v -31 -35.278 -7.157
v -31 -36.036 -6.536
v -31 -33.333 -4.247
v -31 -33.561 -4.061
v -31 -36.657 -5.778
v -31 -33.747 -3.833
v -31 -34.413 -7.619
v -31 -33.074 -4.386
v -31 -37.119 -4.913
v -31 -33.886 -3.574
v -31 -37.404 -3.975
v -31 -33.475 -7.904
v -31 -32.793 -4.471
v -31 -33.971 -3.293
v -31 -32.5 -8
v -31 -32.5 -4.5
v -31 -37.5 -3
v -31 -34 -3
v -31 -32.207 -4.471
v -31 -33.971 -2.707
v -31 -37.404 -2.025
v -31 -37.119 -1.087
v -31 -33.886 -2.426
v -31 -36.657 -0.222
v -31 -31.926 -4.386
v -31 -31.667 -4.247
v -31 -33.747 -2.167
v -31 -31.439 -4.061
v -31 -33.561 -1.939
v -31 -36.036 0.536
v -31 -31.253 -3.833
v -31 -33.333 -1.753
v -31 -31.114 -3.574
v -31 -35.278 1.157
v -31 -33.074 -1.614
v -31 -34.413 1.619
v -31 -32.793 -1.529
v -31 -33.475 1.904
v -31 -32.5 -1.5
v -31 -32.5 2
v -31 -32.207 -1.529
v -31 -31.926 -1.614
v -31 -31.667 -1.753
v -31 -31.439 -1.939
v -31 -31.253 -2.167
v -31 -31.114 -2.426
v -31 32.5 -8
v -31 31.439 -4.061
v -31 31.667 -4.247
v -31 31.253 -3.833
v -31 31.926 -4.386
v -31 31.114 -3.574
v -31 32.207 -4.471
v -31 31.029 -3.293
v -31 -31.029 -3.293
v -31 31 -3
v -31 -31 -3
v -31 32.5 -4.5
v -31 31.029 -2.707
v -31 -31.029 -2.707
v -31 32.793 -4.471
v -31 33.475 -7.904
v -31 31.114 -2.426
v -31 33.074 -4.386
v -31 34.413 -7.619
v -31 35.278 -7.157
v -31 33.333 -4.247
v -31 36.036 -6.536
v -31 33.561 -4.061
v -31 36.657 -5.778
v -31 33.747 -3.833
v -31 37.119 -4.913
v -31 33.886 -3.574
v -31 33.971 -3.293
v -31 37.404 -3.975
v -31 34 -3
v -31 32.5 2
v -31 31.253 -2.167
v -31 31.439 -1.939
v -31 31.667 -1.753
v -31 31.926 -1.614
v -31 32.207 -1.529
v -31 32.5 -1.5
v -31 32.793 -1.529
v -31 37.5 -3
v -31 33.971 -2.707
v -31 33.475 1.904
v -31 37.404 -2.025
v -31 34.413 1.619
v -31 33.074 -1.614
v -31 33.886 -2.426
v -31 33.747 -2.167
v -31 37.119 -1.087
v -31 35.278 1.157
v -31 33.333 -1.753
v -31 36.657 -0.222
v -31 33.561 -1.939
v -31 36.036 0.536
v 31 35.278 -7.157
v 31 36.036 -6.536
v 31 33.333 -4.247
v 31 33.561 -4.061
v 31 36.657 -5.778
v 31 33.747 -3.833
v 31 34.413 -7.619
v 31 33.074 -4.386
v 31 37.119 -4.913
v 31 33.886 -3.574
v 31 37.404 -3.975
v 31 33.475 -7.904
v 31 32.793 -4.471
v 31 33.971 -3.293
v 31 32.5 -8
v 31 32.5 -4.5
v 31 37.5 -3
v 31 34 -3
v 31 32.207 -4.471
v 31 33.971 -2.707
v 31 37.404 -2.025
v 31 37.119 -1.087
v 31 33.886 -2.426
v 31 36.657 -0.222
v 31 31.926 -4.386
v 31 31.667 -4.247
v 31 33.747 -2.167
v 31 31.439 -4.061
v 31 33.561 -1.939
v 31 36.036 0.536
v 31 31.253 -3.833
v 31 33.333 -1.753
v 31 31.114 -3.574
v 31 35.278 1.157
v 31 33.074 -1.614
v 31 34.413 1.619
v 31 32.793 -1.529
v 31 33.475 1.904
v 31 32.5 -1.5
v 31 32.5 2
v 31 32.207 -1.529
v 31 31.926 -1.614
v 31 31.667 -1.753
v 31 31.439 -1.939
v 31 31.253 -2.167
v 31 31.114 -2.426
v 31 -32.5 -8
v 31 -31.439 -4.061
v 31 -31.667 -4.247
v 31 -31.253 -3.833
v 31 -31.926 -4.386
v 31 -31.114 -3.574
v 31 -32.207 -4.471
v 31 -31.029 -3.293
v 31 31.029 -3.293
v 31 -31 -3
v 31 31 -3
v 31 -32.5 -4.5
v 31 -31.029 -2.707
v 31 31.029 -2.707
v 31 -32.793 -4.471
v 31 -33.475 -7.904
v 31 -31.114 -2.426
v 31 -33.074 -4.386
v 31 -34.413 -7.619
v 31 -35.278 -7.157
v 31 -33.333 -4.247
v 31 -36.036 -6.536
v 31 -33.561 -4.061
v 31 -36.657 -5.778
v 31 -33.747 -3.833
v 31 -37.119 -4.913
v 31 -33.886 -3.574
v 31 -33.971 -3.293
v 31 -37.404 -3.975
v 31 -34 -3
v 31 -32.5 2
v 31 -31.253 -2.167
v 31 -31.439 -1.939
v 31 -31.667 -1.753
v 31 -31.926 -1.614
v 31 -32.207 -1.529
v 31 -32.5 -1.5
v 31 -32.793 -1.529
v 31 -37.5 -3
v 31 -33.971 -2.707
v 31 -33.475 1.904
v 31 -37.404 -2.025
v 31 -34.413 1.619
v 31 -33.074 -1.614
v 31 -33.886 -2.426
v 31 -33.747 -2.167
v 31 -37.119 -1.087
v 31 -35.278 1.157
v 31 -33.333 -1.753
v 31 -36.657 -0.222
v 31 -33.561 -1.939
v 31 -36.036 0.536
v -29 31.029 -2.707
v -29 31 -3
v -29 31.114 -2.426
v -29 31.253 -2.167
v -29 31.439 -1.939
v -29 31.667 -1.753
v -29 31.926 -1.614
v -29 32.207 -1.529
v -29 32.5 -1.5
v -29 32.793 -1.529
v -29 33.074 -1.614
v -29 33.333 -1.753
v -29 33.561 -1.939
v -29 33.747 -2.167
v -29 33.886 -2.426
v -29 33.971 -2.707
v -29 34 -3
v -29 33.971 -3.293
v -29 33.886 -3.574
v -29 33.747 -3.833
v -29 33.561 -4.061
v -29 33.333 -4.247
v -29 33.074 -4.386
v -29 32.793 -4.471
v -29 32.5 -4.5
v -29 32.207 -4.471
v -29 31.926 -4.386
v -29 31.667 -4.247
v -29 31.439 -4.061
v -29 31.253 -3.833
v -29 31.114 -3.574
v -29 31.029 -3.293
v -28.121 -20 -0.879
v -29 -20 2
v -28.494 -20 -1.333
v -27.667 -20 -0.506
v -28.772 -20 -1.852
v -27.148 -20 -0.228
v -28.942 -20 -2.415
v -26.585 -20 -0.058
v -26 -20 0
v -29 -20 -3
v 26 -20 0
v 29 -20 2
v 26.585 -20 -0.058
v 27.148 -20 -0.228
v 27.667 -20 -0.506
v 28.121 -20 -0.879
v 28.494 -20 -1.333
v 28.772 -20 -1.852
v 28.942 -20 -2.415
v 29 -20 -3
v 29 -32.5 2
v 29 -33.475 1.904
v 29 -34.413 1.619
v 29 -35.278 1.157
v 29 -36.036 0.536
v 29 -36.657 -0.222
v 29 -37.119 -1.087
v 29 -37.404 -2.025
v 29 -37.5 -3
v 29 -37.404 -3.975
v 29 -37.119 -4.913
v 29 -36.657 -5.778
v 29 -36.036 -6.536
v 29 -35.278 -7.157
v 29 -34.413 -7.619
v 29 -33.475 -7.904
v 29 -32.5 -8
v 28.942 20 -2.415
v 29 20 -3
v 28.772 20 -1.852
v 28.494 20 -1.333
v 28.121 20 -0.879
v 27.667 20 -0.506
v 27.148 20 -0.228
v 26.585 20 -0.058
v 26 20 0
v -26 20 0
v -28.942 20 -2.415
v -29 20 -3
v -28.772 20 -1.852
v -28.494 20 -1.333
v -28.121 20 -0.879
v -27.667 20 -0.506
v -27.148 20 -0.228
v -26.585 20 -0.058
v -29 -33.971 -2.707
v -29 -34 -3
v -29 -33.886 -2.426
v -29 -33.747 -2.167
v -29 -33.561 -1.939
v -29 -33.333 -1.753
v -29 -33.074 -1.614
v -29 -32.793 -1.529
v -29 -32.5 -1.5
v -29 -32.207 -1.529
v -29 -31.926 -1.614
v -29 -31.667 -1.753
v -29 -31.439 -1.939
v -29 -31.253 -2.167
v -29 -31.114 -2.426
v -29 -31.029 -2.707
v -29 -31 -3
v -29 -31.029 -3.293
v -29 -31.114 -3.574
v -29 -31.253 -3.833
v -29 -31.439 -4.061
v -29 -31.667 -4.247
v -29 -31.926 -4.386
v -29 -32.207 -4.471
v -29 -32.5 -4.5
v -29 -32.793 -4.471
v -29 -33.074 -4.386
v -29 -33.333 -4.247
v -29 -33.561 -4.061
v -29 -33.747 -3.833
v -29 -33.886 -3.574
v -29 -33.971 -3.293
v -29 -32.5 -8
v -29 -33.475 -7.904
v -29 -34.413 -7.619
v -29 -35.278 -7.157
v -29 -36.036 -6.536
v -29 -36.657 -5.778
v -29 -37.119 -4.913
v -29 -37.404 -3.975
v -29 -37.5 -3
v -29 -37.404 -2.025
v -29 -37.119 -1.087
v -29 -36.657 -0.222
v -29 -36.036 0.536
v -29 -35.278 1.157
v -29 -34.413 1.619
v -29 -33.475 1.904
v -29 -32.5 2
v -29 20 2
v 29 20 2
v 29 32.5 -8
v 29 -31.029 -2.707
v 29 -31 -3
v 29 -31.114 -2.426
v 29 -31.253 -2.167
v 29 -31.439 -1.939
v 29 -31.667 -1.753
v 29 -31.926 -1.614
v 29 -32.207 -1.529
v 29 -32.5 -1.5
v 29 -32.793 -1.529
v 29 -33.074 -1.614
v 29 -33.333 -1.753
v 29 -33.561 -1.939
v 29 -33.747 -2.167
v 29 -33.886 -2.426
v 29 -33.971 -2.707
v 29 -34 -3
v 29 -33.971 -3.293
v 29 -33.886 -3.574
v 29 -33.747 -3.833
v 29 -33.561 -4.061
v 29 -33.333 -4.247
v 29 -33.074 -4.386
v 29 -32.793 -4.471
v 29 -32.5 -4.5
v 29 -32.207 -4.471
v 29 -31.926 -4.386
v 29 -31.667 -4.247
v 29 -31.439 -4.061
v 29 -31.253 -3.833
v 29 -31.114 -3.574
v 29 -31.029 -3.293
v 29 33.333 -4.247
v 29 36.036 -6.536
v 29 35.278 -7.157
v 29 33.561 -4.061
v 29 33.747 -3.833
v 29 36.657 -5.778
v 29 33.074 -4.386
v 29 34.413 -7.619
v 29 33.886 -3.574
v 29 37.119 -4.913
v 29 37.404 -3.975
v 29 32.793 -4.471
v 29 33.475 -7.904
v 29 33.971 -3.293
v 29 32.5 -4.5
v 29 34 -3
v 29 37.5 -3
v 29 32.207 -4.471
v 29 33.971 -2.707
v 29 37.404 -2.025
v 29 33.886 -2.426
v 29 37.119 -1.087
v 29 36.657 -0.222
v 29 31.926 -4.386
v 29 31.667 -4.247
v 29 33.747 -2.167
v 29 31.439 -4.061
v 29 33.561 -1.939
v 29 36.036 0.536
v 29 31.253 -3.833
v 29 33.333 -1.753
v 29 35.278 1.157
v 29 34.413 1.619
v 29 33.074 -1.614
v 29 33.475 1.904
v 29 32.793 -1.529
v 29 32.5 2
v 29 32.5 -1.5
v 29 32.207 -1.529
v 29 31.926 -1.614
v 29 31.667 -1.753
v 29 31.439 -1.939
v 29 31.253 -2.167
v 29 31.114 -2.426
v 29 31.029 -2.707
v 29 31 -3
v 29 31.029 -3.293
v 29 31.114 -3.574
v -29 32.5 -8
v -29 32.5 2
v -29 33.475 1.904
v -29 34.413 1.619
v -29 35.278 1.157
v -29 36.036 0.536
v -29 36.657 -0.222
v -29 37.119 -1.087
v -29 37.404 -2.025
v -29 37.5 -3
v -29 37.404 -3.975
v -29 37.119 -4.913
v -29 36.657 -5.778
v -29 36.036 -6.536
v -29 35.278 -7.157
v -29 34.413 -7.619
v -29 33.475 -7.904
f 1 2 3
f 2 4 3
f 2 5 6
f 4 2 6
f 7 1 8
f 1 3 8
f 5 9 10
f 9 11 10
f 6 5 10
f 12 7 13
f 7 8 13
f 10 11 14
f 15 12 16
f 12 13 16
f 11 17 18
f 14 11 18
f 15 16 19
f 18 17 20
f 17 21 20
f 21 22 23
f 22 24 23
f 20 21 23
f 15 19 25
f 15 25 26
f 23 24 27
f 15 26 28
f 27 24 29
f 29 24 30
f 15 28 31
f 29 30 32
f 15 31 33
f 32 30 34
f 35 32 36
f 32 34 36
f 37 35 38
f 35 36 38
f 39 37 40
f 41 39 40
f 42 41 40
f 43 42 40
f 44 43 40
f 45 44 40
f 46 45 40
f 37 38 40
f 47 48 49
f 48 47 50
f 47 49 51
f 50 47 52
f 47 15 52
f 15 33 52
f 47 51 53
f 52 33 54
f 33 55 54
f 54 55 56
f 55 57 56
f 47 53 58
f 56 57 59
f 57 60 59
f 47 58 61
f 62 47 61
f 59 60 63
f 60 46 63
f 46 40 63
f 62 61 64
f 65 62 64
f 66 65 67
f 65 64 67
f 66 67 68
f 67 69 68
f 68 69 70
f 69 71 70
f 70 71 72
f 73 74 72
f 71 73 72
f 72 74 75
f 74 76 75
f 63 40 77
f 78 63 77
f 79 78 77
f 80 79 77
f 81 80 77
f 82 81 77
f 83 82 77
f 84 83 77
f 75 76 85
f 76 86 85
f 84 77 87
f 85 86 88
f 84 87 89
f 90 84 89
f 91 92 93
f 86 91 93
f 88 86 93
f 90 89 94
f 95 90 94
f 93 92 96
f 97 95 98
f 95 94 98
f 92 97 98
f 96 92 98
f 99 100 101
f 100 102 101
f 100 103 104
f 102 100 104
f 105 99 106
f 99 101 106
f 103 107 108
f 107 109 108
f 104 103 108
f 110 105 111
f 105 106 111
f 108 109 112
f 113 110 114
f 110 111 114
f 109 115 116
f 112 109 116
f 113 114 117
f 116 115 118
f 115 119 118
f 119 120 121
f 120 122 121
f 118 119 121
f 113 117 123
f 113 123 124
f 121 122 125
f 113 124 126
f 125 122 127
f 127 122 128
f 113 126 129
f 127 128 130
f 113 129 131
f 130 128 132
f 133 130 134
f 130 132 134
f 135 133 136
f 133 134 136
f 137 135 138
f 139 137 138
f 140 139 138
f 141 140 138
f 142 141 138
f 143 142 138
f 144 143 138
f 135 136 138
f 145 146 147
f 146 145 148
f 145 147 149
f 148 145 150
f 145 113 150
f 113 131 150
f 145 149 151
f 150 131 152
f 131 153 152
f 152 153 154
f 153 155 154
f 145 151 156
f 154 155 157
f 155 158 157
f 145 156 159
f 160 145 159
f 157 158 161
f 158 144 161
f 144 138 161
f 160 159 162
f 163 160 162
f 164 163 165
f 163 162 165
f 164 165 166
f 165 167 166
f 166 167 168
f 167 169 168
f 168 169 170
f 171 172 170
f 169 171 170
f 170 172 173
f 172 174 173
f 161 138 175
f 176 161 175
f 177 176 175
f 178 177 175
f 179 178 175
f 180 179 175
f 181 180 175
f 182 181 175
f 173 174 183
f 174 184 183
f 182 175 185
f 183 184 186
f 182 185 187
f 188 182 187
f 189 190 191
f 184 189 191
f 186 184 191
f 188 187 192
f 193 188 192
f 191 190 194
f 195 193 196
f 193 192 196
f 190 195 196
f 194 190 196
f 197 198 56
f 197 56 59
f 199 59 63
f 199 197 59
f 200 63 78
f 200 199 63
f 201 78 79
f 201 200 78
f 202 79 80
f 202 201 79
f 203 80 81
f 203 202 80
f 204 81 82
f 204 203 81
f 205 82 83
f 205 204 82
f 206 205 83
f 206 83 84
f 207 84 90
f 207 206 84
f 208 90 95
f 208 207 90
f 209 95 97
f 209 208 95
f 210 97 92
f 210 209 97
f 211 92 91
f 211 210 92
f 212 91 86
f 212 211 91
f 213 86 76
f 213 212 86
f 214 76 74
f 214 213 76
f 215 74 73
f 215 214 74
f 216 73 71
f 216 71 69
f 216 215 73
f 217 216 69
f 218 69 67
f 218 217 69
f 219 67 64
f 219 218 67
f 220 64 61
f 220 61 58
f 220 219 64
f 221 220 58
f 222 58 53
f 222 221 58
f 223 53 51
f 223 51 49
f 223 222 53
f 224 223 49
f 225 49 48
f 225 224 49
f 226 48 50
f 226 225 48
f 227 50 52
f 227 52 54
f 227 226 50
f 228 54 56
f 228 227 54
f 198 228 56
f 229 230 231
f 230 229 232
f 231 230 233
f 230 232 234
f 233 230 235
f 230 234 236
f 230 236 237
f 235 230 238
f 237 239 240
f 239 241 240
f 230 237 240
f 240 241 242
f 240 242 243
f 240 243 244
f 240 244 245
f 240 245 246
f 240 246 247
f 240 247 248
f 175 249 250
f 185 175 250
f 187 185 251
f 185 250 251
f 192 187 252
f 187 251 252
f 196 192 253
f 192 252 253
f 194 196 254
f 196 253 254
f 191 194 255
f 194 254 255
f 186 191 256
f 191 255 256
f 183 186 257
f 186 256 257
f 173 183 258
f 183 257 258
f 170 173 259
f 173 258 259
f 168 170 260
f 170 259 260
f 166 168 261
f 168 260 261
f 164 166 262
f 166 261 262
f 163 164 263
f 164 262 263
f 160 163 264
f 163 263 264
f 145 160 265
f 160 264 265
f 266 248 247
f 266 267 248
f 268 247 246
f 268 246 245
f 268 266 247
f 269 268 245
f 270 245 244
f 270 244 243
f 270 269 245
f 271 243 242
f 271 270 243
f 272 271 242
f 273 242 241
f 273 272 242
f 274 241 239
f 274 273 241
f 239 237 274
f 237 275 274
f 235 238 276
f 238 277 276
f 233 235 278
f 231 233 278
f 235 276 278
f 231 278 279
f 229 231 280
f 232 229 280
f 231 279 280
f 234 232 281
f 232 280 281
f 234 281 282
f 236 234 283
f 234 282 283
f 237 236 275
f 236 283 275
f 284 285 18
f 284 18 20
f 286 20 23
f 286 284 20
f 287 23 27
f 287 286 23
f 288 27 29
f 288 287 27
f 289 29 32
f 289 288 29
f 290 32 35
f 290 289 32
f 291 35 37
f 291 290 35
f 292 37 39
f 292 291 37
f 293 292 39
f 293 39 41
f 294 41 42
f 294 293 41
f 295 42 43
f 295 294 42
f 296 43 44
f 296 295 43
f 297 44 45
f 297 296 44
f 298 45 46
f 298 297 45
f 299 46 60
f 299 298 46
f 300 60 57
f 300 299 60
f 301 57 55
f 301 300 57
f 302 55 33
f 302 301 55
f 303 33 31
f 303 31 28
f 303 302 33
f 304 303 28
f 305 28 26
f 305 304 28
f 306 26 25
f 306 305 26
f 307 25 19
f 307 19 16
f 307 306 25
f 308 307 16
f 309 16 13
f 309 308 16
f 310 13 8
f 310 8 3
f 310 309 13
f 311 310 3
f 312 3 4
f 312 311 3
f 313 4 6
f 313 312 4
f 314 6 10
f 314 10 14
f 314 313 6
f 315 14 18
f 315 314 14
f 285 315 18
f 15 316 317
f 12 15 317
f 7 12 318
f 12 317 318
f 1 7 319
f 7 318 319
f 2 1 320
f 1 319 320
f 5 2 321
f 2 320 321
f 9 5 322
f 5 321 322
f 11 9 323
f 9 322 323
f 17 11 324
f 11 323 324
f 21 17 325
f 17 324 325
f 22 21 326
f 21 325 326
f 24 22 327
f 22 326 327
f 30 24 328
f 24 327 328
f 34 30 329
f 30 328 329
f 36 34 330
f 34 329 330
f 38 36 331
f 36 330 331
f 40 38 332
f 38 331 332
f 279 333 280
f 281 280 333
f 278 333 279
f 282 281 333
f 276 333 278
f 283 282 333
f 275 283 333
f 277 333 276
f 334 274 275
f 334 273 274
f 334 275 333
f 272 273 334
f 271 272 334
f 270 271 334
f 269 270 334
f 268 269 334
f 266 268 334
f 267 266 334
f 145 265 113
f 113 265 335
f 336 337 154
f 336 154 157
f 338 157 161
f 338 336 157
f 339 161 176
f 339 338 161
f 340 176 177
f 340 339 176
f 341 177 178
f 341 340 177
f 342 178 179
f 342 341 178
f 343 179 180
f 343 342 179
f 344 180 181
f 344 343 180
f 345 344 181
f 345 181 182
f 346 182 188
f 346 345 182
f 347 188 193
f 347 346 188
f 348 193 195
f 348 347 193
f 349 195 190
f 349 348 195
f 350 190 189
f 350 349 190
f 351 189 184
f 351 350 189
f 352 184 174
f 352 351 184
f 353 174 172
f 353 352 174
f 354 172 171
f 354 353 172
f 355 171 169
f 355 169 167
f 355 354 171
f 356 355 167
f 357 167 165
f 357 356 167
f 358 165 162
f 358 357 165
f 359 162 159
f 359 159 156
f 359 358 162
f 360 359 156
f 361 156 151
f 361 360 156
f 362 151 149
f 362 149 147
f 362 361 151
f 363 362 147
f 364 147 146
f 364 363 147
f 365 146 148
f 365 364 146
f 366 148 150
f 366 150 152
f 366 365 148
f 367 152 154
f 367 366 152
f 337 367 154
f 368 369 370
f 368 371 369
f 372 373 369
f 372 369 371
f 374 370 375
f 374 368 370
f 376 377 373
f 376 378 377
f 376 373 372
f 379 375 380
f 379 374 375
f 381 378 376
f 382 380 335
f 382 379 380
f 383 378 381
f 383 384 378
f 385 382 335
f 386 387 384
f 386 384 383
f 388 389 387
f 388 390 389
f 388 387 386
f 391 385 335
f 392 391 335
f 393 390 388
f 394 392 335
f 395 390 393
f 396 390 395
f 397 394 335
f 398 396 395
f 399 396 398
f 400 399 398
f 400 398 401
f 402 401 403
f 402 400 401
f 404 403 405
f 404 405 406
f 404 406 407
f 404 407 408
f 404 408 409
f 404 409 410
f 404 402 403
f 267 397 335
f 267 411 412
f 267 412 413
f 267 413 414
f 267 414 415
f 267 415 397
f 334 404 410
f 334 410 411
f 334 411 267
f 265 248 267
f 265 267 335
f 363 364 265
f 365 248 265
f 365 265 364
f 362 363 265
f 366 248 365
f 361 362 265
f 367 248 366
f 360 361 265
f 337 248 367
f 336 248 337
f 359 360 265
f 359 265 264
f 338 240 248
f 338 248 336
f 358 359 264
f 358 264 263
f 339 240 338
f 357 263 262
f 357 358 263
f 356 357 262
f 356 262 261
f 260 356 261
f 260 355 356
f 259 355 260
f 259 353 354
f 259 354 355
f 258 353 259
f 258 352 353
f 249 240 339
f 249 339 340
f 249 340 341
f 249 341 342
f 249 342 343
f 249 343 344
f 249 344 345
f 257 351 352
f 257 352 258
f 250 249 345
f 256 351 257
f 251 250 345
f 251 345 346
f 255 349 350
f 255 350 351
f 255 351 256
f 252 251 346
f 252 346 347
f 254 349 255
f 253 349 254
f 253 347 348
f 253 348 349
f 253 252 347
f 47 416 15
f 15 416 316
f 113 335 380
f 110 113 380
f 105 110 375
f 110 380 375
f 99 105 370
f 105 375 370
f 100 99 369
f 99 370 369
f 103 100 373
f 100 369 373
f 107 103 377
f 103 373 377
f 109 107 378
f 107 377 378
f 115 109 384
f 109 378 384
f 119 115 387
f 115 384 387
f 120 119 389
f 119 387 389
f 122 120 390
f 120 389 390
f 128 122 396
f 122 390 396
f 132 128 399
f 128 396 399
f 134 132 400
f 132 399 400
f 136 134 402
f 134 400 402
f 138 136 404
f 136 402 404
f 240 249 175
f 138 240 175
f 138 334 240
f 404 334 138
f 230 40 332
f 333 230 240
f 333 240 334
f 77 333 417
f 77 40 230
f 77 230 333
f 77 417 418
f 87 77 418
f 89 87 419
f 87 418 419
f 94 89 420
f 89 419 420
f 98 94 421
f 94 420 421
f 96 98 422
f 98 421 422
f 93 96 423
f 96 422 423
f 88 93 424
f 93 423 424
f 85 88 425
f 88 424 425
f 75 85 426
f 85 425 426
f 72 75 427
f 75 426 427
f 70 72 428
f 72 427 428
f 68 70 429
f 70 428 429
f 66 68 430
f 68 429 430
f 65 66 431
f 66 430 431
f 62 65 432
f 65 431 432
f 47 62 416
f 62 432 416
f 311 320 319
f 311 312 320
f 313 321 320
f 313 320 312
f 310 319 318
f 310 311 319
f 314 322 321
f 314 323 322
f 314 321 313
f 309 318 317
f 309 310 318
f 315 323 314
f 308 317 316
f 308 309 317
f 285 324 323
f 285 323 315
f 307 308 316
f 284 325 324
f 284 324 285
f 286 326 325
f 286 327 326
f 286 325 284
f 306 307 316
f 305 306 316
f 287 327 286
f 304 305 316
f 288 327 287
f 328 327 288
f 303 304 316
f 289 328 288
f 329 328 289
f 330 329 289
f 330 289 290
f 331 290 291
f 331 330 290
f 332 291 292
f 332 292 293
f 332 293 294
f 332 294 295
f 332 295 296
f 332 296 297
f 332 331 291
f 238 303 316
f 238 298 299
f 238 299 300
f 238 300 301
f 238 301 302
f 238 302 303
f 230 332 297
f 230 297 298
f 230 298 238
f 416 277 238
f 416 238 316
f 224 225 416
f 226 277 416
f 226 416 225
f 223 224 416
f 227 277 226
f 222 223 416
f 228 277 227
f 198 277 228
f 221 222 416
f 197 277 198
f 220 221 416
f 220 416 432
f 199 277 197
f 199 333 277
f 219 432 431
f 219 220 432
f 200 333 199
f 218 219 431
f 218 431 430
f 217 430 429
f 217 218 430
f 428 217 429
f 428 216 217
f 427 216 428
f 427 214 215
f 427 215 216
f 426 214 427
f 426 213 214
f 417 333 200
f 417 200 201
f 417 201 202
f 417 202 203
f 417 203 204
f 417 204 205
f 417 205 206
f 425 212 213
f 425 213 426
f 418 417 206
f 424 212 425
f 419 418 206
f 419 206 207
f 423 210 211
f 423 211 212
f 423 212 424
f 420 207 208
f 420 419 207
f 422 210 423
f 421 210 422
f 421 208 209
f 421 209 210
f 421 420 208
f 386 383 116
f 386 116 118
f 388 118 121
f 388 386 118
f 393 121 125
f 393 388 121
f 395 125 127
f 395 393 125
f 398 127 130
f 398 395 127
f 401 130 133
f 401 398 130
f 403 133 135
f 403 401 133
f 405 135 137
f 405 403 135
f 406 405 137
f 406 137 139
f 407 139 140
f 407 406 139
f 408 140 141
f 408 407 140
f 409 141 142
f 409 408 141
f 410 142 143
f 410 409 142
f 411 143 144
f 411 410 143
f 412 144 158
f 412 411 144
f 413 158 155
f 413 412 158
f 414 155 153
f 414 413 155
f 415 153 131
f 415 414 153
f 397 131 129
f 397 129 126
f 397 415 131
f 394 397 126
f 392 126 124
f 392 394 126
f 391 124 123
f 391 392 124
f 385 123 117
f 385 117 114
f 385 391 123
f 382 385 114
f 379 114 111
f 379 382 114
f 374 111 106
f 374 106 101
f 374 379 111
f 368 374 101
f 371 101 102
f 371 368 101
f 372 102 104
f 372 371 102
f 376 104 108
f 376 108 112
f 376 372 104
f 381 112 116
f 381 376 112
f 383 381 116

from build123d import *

# Parameters (mm, degrees)
SKETCH_W     = 58
SKETCH_H     = 40
PAD_DEPTH    = 2
SKETCH001_R  = 1.5
PAD001_DEPTH = 2
FILLET_R     = 3
SKETCH002_R  = 1.5
PAD002_DEPTH = 2
FILLET001_R  = 3


with BuildPart() as part:
    # Sketch → Pad (new body)
    with BuildSketch(Plane.XY):
        Rectangle(SKETCH_W, SKETCH_H)
    extrude(amount=PAD_DEPTH)

    # Sketch001 (on Face4 of Pad) → Pad001 (join)
    with BuildSketch(Plane(origin=(-29, 0, 0), x_dir=(0, -1, 0), z_dir=(-1, 0, 0))):
        with BuildLine():
            Line((-32.5, 2), (32.5, 2))
            ThreePointArc((32.5, -8), (37.5, -3), (32.5, 2))
            Line((-32.5, -8), (32.5, -8))
            ThreePointArc((-32.5, 2), (-37.5, -3), (-32.5, -8))
        make_face()
        with Locations((-32.5, -3)):
            Circle(SKETCH001_R, mode=Mode.SUBTRACT)
        with Locations((32.5, -3)):
            Circle(SKETCH001_R, mode=Mode.SUBTRACT)
    extrude(amount=PAD001_DEPTH)

    # Fillet
    fillet_edges = [part.edges().sort_by_distance(p)[0] for p in [
        (-29, 0, 0),
    ]]
    fillet(fillet_edges, radius=FILLET_R)

    # Sketch002 (on Face12 of Fillet) → Pad002 (join)
    with BuildSketch(Plane.YZ.offset(29)):
        with BuildLine():
            Line((-32.5, 2), (32.5, 2))
            ThreePointArc((32.5, -8), (37.5, -3), (32.5, 2))
            Line((-32.5, -8), (32.5, -8))
            ThreePointArc((-32.5, 2), (-37.5, -3), (-32.5, -8))
        make_face()
        with Locations((-32.5, -3)):
            Circle(SKETCH002_R, mode=Mode.SUBTRACT)
        with Locations((32.5, -3)):
            Circle(SKETCH002_R, mode=Mode.SUBTRACT)
    extrude(amount=PAD002_DEPTH)

    # Fillet001
    fillet001_edges = [part.edges().sort_by_distance(p)[0] for p in [
        (29, 0, 0),
    ]]
    fillet(fillet001_edges, radius=FILLET001_R)


solid = part.part
